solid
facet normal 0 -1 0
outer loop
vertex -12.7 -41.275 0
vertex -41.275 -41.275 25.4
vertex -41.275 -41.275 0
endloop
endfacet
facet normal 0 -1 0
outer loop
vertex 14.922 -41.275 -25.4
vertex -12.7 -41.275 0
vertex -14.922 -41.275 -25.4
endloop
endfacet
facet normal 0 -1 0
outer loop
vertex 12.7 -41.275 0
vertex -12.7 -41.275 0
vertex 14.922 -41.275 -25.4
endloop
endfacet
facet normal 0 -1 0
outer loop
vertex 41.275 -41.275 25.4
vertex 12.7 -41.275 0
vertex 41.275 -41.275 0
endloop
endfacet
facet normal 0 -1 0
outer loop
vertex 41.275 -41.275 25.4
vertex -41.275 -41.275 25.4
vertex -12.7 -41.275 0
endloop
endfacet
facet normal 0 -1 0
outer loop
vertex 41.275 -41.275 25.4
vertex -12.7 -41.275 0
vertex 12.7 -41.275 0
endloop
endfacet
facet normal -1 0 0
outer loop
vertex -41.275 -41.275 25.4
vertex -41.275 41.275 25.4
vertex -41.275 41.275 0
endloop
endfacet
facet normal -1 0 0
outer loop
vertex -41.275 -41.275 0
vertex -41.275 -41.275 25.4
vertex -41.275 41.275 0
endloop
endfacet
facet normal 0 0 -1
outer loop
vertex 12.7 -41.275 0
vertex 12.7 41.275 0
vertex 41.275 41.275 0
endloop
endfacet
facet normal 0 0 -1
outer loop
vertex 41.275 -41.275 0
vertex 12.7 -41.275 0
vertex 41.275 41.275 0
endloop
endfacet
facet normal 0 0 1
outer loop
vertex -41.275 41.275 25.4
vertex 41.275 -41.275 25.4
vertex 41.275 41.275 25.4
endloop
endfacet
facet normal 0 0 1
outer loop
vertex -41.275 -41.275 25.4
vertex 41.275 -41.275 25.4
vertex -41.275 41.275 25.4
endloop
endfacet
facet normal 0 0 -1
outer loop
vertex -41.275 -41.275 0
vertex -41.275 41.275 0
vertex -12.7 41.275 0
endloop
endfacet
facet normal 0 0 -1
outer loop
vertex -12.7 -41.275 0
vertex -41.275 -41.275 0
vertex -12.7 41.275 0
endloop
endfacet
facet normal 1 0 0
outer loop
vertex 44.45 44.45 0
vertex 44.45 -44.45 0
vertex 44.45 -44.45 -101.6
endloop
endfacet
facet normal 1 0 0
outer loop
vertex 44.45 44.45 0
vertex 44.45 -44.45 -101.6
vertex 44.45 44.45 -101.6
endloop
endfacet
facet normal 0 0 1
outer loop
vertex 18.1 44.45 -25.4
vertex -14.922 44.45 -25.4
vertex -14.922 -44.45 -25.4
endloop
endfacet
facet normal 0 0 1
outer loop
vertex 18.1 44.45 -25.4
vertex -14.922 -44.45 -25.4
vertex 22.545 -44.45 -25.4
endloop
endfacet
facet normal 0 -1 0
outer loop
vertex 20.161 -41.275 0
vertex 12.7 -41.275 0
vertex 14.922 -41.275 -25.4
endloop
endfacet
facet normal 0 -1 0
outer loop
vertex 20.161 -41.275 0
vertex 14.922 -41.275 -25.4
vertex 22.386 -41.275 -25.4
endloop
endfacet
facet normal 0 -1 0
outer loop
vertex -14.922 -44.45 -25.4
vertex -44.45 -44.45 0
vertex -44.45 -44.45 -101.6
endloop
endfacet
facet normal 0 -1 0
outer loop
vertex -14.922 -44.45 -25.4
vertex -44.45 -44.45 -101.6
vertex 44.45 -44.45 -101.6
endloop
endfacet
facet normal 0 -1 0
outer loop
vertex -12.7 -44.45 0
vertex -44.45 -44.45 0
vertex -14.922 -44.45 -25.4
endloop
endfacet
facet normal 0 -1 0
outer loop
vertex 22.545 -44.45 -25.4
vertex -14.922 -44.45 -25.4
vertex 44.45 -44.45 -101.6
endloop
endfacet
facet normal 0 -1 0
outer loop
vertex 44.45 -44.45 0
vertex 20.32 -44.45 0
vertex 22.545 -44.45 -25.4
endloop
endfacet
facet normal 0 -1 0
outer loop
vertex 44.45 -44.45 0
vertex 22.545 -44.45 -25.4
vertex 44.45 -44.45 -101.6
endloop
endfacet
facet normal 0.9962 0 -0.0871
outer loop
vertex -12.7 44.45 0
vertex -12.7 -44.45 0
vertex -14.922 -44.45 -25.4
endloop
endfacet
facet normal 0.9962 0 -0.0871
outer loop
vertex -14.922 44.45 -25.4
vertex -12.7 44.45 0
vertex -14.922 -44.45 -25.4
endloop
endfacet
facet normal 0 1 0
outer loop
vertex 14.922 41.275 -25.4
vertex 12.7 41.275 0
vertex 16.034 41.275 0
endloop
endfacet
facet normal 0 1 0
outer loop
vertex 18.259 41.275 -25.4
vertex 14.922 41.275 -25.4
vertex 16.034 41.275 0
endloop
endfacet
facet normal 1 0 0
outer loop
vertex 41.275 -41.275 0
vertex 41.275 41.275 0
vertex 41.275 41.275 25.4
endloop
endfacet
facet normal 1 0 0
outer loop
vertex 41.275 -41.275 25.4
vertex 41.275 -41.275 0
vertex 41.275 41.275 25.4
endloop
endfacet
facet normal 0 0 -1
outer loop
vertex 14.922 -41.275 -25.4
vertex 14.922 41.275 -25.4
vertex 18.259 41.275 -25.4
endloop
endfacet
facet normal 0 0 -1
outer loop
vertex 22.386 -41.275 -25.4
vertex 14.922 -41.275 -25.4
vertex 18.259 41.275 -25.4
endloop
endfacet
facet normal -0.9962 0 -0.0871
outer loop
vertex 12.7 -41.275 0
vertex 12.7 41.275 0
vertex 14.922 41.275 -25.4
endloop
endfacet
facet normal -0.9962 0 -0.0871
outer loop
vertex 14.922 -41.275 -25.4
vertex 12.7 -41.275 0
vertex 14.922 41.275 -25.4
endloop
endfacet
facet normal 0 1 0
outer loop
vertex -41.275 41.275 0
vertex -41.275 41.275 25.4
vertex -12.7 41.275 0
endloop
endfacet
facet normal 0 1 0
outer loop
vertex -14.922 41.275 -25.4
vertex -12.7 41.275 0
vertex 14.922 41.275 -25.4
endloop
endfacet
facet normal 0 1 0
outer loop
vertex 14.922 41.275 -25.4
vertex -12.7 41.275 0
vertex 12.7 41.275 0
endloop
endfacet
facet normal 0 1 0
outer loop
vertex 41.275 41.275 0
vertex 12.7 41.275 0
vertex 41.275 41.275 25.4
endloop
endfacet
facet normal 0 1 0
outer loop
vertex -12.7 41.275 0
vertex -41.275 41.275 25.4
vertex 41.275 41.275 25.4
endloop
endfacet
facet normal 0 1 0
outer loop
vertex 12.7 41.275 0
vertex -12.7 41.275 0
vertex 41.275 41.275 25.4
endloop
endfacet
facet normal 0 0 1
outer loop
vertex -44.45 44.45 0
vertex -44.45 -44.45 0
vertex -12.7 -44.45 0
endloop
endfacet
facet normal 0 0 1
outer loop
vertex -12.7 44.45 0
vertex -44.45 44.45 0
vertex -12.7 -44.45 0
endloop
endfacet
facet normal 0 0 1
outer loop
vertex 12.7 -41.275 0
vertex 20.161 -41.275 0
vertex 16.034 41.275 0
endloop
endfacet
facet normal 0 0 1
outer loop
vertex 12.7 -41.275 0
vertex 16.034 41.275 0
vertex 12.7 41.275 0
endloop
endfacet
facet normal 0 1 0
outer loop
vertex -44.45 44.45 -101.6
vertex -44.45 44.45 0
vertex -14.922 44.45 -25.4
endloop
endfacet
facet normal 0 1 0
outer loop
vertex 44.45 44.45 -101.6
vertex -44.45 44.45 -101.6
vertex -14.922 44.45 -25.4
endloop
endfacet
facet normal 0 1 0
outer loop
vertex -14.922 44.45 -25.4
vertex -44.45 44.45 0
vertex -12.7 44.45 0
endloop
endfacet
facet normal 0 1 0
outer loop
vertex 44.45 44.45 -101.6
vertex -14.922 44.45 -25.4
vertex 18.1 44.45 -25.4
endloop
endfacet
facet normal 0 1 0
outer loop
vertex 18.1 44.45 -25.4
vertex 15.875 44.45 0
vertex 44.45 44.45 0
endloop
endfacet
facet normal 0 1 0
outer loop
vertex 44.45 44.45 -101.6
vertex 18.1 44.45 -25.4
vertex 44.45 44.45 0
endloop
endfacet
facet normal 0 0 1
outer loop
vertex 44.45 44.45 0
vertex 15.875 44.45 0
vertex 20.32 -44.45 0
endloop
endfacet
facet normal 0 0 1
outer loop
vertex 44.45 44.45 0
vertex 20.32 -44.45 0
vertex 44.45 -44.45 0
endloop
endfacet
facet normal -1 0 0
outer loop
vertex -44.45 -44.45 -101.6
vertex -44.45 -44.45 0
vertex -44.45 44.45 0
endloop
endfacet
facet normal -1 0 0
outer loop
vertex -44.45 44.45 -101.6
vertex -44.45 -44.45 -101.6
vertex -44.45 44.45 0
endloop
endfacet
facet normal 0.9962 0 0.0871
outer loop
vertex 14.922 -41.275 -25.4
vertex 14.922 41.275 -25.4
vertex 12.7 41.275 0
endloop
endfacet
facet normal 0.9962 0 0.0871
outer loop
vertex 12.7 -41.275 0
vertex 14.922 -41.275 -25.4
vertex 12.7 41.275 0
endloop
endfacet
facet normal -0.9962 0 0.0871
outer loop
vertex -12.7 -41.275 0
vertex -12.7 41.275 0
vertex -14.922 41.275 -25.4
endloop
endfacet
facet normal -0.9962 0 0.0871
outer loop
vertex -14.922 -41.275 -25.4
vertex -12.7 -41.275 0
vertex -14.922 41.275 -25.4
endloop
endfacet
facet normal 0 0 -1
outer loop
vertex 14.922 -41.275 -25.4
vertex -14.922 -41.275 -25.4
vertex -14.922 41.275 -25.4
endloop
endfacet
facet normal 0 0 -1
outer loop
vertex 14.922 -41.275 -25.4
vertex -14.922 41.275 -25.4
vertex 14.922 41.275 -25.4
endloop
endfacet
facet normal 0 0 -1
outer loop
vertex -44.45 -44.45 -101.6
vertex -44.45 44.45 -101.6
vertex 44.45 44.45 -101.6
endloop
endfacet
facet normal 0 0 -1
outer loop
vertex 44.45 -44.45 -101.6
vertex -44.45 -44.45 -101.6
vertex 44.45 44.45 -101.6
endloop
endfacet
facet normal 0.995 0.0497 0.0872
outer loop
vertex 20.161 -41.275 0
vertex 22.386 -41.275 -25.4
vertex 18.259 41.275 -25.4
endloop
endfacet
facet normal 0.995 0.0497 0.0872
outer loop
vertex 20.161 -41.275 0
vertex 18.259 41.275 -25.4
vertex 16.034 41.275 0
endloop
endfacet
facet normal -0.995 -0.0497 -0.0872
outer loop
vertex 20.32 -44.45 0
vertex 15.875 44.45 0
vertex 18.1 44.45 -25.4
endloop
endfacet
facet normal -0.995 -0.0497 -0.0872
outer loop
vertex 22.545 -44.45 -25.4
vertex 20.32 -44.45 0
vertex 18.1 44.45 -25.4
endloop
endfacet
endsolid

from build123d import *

# Parameters (mm, degrees)
F0_W      = 88.9
F0_H      = 88.9
F1_DEPTH  = 101.6
F3_DEPTH  = 50.8
F8_DEPTH  = 101.6
F10_DEPTH = 41.275
F12_DEPTH = 41.275
F14_DEPTH = 101.6


with BuildPart() as f1:
    # F0 (on Top) → F1 (new body)
    with BuildSketch(Plane.XY):
        Rectangle(F0_W, F0_H)
    extrude(amount=-F1_DEPTH)

    # F2 (on Front) → F3 (cut, symmetric)
    with BuildSketch(Plane.XZ):
        Polygon((10.16, 0), (-12.7, 0), (-14.9222120536, -25.4), (10.16, -25.4), align=None)
    extrude(amount=F3_DEPTH, both=True, mode=Mode.SUBTRACT)

    # F7 (on 3pt) → F8 (cut, symmetric)
    with BuildSketch(Plane(origin=(-2.1773690773, 43.5473815461, 0), x_dir=(-0.9987523389, -0.0499376169, 0), z_dir=(-0.0499376169, 0.9987523389, 0))):
        Polygon((-18.0749204528, 0), (-20.2971325064, -25.4), (-0.2949204528, -25.4), (-0.2949204528, 0), align=None)
    extrude(amount=F8_DEPTH, both=True, mode=Mode.SUBTRACT)


with BuildPart() as f10:
    # F9 (on Front) → F10 (new body, symmetric)
    with BuildSketch(Plane.XZ):
        Polygon((41.275, 0), (41.275, 25.4), (-41.275, 25.4), (-41.275, 0), (-12.7, 0), (-14.9222120536, -25.4), (14.9222120536, -25.4), (12.7, 0), align=None)
    extrude(amount=F10_DEPTH, both=True)


with BuildPart() as f12:
    # F11 (on Front) → F12 (new body, symmetric)
    with BuildSketch(Plane.XZ):
        Polygon((25.0822120536, 0), (12.7, 0), (14.9222120536, -25.4), (25.0822120536, -25.4), align=None)
    extrude(amount=F12_DEPTH, both=True)

    # F13 (on 3pt) → F14 (cut, symmetric)
    with BuildSketch(Plane(origin=(-2.1773690773, 43.5473815461, 0), x_dir=(-0.9987523389, -0.0499376169, 0), z_dir=(-0.0499376169, 0.9987523389, 0))):
        Polygon((-20.2971325064, -25.4), (-17.8526992475, 2.54), (-32.9971325064, 2.54), (-32.9971325064, -25.4), align=None)
    extrude(amount=F14_DEPTH, both=True, mode=Mode.SUBTRACT)


solid = Compound([f1.part, f10.part, f12.part])
